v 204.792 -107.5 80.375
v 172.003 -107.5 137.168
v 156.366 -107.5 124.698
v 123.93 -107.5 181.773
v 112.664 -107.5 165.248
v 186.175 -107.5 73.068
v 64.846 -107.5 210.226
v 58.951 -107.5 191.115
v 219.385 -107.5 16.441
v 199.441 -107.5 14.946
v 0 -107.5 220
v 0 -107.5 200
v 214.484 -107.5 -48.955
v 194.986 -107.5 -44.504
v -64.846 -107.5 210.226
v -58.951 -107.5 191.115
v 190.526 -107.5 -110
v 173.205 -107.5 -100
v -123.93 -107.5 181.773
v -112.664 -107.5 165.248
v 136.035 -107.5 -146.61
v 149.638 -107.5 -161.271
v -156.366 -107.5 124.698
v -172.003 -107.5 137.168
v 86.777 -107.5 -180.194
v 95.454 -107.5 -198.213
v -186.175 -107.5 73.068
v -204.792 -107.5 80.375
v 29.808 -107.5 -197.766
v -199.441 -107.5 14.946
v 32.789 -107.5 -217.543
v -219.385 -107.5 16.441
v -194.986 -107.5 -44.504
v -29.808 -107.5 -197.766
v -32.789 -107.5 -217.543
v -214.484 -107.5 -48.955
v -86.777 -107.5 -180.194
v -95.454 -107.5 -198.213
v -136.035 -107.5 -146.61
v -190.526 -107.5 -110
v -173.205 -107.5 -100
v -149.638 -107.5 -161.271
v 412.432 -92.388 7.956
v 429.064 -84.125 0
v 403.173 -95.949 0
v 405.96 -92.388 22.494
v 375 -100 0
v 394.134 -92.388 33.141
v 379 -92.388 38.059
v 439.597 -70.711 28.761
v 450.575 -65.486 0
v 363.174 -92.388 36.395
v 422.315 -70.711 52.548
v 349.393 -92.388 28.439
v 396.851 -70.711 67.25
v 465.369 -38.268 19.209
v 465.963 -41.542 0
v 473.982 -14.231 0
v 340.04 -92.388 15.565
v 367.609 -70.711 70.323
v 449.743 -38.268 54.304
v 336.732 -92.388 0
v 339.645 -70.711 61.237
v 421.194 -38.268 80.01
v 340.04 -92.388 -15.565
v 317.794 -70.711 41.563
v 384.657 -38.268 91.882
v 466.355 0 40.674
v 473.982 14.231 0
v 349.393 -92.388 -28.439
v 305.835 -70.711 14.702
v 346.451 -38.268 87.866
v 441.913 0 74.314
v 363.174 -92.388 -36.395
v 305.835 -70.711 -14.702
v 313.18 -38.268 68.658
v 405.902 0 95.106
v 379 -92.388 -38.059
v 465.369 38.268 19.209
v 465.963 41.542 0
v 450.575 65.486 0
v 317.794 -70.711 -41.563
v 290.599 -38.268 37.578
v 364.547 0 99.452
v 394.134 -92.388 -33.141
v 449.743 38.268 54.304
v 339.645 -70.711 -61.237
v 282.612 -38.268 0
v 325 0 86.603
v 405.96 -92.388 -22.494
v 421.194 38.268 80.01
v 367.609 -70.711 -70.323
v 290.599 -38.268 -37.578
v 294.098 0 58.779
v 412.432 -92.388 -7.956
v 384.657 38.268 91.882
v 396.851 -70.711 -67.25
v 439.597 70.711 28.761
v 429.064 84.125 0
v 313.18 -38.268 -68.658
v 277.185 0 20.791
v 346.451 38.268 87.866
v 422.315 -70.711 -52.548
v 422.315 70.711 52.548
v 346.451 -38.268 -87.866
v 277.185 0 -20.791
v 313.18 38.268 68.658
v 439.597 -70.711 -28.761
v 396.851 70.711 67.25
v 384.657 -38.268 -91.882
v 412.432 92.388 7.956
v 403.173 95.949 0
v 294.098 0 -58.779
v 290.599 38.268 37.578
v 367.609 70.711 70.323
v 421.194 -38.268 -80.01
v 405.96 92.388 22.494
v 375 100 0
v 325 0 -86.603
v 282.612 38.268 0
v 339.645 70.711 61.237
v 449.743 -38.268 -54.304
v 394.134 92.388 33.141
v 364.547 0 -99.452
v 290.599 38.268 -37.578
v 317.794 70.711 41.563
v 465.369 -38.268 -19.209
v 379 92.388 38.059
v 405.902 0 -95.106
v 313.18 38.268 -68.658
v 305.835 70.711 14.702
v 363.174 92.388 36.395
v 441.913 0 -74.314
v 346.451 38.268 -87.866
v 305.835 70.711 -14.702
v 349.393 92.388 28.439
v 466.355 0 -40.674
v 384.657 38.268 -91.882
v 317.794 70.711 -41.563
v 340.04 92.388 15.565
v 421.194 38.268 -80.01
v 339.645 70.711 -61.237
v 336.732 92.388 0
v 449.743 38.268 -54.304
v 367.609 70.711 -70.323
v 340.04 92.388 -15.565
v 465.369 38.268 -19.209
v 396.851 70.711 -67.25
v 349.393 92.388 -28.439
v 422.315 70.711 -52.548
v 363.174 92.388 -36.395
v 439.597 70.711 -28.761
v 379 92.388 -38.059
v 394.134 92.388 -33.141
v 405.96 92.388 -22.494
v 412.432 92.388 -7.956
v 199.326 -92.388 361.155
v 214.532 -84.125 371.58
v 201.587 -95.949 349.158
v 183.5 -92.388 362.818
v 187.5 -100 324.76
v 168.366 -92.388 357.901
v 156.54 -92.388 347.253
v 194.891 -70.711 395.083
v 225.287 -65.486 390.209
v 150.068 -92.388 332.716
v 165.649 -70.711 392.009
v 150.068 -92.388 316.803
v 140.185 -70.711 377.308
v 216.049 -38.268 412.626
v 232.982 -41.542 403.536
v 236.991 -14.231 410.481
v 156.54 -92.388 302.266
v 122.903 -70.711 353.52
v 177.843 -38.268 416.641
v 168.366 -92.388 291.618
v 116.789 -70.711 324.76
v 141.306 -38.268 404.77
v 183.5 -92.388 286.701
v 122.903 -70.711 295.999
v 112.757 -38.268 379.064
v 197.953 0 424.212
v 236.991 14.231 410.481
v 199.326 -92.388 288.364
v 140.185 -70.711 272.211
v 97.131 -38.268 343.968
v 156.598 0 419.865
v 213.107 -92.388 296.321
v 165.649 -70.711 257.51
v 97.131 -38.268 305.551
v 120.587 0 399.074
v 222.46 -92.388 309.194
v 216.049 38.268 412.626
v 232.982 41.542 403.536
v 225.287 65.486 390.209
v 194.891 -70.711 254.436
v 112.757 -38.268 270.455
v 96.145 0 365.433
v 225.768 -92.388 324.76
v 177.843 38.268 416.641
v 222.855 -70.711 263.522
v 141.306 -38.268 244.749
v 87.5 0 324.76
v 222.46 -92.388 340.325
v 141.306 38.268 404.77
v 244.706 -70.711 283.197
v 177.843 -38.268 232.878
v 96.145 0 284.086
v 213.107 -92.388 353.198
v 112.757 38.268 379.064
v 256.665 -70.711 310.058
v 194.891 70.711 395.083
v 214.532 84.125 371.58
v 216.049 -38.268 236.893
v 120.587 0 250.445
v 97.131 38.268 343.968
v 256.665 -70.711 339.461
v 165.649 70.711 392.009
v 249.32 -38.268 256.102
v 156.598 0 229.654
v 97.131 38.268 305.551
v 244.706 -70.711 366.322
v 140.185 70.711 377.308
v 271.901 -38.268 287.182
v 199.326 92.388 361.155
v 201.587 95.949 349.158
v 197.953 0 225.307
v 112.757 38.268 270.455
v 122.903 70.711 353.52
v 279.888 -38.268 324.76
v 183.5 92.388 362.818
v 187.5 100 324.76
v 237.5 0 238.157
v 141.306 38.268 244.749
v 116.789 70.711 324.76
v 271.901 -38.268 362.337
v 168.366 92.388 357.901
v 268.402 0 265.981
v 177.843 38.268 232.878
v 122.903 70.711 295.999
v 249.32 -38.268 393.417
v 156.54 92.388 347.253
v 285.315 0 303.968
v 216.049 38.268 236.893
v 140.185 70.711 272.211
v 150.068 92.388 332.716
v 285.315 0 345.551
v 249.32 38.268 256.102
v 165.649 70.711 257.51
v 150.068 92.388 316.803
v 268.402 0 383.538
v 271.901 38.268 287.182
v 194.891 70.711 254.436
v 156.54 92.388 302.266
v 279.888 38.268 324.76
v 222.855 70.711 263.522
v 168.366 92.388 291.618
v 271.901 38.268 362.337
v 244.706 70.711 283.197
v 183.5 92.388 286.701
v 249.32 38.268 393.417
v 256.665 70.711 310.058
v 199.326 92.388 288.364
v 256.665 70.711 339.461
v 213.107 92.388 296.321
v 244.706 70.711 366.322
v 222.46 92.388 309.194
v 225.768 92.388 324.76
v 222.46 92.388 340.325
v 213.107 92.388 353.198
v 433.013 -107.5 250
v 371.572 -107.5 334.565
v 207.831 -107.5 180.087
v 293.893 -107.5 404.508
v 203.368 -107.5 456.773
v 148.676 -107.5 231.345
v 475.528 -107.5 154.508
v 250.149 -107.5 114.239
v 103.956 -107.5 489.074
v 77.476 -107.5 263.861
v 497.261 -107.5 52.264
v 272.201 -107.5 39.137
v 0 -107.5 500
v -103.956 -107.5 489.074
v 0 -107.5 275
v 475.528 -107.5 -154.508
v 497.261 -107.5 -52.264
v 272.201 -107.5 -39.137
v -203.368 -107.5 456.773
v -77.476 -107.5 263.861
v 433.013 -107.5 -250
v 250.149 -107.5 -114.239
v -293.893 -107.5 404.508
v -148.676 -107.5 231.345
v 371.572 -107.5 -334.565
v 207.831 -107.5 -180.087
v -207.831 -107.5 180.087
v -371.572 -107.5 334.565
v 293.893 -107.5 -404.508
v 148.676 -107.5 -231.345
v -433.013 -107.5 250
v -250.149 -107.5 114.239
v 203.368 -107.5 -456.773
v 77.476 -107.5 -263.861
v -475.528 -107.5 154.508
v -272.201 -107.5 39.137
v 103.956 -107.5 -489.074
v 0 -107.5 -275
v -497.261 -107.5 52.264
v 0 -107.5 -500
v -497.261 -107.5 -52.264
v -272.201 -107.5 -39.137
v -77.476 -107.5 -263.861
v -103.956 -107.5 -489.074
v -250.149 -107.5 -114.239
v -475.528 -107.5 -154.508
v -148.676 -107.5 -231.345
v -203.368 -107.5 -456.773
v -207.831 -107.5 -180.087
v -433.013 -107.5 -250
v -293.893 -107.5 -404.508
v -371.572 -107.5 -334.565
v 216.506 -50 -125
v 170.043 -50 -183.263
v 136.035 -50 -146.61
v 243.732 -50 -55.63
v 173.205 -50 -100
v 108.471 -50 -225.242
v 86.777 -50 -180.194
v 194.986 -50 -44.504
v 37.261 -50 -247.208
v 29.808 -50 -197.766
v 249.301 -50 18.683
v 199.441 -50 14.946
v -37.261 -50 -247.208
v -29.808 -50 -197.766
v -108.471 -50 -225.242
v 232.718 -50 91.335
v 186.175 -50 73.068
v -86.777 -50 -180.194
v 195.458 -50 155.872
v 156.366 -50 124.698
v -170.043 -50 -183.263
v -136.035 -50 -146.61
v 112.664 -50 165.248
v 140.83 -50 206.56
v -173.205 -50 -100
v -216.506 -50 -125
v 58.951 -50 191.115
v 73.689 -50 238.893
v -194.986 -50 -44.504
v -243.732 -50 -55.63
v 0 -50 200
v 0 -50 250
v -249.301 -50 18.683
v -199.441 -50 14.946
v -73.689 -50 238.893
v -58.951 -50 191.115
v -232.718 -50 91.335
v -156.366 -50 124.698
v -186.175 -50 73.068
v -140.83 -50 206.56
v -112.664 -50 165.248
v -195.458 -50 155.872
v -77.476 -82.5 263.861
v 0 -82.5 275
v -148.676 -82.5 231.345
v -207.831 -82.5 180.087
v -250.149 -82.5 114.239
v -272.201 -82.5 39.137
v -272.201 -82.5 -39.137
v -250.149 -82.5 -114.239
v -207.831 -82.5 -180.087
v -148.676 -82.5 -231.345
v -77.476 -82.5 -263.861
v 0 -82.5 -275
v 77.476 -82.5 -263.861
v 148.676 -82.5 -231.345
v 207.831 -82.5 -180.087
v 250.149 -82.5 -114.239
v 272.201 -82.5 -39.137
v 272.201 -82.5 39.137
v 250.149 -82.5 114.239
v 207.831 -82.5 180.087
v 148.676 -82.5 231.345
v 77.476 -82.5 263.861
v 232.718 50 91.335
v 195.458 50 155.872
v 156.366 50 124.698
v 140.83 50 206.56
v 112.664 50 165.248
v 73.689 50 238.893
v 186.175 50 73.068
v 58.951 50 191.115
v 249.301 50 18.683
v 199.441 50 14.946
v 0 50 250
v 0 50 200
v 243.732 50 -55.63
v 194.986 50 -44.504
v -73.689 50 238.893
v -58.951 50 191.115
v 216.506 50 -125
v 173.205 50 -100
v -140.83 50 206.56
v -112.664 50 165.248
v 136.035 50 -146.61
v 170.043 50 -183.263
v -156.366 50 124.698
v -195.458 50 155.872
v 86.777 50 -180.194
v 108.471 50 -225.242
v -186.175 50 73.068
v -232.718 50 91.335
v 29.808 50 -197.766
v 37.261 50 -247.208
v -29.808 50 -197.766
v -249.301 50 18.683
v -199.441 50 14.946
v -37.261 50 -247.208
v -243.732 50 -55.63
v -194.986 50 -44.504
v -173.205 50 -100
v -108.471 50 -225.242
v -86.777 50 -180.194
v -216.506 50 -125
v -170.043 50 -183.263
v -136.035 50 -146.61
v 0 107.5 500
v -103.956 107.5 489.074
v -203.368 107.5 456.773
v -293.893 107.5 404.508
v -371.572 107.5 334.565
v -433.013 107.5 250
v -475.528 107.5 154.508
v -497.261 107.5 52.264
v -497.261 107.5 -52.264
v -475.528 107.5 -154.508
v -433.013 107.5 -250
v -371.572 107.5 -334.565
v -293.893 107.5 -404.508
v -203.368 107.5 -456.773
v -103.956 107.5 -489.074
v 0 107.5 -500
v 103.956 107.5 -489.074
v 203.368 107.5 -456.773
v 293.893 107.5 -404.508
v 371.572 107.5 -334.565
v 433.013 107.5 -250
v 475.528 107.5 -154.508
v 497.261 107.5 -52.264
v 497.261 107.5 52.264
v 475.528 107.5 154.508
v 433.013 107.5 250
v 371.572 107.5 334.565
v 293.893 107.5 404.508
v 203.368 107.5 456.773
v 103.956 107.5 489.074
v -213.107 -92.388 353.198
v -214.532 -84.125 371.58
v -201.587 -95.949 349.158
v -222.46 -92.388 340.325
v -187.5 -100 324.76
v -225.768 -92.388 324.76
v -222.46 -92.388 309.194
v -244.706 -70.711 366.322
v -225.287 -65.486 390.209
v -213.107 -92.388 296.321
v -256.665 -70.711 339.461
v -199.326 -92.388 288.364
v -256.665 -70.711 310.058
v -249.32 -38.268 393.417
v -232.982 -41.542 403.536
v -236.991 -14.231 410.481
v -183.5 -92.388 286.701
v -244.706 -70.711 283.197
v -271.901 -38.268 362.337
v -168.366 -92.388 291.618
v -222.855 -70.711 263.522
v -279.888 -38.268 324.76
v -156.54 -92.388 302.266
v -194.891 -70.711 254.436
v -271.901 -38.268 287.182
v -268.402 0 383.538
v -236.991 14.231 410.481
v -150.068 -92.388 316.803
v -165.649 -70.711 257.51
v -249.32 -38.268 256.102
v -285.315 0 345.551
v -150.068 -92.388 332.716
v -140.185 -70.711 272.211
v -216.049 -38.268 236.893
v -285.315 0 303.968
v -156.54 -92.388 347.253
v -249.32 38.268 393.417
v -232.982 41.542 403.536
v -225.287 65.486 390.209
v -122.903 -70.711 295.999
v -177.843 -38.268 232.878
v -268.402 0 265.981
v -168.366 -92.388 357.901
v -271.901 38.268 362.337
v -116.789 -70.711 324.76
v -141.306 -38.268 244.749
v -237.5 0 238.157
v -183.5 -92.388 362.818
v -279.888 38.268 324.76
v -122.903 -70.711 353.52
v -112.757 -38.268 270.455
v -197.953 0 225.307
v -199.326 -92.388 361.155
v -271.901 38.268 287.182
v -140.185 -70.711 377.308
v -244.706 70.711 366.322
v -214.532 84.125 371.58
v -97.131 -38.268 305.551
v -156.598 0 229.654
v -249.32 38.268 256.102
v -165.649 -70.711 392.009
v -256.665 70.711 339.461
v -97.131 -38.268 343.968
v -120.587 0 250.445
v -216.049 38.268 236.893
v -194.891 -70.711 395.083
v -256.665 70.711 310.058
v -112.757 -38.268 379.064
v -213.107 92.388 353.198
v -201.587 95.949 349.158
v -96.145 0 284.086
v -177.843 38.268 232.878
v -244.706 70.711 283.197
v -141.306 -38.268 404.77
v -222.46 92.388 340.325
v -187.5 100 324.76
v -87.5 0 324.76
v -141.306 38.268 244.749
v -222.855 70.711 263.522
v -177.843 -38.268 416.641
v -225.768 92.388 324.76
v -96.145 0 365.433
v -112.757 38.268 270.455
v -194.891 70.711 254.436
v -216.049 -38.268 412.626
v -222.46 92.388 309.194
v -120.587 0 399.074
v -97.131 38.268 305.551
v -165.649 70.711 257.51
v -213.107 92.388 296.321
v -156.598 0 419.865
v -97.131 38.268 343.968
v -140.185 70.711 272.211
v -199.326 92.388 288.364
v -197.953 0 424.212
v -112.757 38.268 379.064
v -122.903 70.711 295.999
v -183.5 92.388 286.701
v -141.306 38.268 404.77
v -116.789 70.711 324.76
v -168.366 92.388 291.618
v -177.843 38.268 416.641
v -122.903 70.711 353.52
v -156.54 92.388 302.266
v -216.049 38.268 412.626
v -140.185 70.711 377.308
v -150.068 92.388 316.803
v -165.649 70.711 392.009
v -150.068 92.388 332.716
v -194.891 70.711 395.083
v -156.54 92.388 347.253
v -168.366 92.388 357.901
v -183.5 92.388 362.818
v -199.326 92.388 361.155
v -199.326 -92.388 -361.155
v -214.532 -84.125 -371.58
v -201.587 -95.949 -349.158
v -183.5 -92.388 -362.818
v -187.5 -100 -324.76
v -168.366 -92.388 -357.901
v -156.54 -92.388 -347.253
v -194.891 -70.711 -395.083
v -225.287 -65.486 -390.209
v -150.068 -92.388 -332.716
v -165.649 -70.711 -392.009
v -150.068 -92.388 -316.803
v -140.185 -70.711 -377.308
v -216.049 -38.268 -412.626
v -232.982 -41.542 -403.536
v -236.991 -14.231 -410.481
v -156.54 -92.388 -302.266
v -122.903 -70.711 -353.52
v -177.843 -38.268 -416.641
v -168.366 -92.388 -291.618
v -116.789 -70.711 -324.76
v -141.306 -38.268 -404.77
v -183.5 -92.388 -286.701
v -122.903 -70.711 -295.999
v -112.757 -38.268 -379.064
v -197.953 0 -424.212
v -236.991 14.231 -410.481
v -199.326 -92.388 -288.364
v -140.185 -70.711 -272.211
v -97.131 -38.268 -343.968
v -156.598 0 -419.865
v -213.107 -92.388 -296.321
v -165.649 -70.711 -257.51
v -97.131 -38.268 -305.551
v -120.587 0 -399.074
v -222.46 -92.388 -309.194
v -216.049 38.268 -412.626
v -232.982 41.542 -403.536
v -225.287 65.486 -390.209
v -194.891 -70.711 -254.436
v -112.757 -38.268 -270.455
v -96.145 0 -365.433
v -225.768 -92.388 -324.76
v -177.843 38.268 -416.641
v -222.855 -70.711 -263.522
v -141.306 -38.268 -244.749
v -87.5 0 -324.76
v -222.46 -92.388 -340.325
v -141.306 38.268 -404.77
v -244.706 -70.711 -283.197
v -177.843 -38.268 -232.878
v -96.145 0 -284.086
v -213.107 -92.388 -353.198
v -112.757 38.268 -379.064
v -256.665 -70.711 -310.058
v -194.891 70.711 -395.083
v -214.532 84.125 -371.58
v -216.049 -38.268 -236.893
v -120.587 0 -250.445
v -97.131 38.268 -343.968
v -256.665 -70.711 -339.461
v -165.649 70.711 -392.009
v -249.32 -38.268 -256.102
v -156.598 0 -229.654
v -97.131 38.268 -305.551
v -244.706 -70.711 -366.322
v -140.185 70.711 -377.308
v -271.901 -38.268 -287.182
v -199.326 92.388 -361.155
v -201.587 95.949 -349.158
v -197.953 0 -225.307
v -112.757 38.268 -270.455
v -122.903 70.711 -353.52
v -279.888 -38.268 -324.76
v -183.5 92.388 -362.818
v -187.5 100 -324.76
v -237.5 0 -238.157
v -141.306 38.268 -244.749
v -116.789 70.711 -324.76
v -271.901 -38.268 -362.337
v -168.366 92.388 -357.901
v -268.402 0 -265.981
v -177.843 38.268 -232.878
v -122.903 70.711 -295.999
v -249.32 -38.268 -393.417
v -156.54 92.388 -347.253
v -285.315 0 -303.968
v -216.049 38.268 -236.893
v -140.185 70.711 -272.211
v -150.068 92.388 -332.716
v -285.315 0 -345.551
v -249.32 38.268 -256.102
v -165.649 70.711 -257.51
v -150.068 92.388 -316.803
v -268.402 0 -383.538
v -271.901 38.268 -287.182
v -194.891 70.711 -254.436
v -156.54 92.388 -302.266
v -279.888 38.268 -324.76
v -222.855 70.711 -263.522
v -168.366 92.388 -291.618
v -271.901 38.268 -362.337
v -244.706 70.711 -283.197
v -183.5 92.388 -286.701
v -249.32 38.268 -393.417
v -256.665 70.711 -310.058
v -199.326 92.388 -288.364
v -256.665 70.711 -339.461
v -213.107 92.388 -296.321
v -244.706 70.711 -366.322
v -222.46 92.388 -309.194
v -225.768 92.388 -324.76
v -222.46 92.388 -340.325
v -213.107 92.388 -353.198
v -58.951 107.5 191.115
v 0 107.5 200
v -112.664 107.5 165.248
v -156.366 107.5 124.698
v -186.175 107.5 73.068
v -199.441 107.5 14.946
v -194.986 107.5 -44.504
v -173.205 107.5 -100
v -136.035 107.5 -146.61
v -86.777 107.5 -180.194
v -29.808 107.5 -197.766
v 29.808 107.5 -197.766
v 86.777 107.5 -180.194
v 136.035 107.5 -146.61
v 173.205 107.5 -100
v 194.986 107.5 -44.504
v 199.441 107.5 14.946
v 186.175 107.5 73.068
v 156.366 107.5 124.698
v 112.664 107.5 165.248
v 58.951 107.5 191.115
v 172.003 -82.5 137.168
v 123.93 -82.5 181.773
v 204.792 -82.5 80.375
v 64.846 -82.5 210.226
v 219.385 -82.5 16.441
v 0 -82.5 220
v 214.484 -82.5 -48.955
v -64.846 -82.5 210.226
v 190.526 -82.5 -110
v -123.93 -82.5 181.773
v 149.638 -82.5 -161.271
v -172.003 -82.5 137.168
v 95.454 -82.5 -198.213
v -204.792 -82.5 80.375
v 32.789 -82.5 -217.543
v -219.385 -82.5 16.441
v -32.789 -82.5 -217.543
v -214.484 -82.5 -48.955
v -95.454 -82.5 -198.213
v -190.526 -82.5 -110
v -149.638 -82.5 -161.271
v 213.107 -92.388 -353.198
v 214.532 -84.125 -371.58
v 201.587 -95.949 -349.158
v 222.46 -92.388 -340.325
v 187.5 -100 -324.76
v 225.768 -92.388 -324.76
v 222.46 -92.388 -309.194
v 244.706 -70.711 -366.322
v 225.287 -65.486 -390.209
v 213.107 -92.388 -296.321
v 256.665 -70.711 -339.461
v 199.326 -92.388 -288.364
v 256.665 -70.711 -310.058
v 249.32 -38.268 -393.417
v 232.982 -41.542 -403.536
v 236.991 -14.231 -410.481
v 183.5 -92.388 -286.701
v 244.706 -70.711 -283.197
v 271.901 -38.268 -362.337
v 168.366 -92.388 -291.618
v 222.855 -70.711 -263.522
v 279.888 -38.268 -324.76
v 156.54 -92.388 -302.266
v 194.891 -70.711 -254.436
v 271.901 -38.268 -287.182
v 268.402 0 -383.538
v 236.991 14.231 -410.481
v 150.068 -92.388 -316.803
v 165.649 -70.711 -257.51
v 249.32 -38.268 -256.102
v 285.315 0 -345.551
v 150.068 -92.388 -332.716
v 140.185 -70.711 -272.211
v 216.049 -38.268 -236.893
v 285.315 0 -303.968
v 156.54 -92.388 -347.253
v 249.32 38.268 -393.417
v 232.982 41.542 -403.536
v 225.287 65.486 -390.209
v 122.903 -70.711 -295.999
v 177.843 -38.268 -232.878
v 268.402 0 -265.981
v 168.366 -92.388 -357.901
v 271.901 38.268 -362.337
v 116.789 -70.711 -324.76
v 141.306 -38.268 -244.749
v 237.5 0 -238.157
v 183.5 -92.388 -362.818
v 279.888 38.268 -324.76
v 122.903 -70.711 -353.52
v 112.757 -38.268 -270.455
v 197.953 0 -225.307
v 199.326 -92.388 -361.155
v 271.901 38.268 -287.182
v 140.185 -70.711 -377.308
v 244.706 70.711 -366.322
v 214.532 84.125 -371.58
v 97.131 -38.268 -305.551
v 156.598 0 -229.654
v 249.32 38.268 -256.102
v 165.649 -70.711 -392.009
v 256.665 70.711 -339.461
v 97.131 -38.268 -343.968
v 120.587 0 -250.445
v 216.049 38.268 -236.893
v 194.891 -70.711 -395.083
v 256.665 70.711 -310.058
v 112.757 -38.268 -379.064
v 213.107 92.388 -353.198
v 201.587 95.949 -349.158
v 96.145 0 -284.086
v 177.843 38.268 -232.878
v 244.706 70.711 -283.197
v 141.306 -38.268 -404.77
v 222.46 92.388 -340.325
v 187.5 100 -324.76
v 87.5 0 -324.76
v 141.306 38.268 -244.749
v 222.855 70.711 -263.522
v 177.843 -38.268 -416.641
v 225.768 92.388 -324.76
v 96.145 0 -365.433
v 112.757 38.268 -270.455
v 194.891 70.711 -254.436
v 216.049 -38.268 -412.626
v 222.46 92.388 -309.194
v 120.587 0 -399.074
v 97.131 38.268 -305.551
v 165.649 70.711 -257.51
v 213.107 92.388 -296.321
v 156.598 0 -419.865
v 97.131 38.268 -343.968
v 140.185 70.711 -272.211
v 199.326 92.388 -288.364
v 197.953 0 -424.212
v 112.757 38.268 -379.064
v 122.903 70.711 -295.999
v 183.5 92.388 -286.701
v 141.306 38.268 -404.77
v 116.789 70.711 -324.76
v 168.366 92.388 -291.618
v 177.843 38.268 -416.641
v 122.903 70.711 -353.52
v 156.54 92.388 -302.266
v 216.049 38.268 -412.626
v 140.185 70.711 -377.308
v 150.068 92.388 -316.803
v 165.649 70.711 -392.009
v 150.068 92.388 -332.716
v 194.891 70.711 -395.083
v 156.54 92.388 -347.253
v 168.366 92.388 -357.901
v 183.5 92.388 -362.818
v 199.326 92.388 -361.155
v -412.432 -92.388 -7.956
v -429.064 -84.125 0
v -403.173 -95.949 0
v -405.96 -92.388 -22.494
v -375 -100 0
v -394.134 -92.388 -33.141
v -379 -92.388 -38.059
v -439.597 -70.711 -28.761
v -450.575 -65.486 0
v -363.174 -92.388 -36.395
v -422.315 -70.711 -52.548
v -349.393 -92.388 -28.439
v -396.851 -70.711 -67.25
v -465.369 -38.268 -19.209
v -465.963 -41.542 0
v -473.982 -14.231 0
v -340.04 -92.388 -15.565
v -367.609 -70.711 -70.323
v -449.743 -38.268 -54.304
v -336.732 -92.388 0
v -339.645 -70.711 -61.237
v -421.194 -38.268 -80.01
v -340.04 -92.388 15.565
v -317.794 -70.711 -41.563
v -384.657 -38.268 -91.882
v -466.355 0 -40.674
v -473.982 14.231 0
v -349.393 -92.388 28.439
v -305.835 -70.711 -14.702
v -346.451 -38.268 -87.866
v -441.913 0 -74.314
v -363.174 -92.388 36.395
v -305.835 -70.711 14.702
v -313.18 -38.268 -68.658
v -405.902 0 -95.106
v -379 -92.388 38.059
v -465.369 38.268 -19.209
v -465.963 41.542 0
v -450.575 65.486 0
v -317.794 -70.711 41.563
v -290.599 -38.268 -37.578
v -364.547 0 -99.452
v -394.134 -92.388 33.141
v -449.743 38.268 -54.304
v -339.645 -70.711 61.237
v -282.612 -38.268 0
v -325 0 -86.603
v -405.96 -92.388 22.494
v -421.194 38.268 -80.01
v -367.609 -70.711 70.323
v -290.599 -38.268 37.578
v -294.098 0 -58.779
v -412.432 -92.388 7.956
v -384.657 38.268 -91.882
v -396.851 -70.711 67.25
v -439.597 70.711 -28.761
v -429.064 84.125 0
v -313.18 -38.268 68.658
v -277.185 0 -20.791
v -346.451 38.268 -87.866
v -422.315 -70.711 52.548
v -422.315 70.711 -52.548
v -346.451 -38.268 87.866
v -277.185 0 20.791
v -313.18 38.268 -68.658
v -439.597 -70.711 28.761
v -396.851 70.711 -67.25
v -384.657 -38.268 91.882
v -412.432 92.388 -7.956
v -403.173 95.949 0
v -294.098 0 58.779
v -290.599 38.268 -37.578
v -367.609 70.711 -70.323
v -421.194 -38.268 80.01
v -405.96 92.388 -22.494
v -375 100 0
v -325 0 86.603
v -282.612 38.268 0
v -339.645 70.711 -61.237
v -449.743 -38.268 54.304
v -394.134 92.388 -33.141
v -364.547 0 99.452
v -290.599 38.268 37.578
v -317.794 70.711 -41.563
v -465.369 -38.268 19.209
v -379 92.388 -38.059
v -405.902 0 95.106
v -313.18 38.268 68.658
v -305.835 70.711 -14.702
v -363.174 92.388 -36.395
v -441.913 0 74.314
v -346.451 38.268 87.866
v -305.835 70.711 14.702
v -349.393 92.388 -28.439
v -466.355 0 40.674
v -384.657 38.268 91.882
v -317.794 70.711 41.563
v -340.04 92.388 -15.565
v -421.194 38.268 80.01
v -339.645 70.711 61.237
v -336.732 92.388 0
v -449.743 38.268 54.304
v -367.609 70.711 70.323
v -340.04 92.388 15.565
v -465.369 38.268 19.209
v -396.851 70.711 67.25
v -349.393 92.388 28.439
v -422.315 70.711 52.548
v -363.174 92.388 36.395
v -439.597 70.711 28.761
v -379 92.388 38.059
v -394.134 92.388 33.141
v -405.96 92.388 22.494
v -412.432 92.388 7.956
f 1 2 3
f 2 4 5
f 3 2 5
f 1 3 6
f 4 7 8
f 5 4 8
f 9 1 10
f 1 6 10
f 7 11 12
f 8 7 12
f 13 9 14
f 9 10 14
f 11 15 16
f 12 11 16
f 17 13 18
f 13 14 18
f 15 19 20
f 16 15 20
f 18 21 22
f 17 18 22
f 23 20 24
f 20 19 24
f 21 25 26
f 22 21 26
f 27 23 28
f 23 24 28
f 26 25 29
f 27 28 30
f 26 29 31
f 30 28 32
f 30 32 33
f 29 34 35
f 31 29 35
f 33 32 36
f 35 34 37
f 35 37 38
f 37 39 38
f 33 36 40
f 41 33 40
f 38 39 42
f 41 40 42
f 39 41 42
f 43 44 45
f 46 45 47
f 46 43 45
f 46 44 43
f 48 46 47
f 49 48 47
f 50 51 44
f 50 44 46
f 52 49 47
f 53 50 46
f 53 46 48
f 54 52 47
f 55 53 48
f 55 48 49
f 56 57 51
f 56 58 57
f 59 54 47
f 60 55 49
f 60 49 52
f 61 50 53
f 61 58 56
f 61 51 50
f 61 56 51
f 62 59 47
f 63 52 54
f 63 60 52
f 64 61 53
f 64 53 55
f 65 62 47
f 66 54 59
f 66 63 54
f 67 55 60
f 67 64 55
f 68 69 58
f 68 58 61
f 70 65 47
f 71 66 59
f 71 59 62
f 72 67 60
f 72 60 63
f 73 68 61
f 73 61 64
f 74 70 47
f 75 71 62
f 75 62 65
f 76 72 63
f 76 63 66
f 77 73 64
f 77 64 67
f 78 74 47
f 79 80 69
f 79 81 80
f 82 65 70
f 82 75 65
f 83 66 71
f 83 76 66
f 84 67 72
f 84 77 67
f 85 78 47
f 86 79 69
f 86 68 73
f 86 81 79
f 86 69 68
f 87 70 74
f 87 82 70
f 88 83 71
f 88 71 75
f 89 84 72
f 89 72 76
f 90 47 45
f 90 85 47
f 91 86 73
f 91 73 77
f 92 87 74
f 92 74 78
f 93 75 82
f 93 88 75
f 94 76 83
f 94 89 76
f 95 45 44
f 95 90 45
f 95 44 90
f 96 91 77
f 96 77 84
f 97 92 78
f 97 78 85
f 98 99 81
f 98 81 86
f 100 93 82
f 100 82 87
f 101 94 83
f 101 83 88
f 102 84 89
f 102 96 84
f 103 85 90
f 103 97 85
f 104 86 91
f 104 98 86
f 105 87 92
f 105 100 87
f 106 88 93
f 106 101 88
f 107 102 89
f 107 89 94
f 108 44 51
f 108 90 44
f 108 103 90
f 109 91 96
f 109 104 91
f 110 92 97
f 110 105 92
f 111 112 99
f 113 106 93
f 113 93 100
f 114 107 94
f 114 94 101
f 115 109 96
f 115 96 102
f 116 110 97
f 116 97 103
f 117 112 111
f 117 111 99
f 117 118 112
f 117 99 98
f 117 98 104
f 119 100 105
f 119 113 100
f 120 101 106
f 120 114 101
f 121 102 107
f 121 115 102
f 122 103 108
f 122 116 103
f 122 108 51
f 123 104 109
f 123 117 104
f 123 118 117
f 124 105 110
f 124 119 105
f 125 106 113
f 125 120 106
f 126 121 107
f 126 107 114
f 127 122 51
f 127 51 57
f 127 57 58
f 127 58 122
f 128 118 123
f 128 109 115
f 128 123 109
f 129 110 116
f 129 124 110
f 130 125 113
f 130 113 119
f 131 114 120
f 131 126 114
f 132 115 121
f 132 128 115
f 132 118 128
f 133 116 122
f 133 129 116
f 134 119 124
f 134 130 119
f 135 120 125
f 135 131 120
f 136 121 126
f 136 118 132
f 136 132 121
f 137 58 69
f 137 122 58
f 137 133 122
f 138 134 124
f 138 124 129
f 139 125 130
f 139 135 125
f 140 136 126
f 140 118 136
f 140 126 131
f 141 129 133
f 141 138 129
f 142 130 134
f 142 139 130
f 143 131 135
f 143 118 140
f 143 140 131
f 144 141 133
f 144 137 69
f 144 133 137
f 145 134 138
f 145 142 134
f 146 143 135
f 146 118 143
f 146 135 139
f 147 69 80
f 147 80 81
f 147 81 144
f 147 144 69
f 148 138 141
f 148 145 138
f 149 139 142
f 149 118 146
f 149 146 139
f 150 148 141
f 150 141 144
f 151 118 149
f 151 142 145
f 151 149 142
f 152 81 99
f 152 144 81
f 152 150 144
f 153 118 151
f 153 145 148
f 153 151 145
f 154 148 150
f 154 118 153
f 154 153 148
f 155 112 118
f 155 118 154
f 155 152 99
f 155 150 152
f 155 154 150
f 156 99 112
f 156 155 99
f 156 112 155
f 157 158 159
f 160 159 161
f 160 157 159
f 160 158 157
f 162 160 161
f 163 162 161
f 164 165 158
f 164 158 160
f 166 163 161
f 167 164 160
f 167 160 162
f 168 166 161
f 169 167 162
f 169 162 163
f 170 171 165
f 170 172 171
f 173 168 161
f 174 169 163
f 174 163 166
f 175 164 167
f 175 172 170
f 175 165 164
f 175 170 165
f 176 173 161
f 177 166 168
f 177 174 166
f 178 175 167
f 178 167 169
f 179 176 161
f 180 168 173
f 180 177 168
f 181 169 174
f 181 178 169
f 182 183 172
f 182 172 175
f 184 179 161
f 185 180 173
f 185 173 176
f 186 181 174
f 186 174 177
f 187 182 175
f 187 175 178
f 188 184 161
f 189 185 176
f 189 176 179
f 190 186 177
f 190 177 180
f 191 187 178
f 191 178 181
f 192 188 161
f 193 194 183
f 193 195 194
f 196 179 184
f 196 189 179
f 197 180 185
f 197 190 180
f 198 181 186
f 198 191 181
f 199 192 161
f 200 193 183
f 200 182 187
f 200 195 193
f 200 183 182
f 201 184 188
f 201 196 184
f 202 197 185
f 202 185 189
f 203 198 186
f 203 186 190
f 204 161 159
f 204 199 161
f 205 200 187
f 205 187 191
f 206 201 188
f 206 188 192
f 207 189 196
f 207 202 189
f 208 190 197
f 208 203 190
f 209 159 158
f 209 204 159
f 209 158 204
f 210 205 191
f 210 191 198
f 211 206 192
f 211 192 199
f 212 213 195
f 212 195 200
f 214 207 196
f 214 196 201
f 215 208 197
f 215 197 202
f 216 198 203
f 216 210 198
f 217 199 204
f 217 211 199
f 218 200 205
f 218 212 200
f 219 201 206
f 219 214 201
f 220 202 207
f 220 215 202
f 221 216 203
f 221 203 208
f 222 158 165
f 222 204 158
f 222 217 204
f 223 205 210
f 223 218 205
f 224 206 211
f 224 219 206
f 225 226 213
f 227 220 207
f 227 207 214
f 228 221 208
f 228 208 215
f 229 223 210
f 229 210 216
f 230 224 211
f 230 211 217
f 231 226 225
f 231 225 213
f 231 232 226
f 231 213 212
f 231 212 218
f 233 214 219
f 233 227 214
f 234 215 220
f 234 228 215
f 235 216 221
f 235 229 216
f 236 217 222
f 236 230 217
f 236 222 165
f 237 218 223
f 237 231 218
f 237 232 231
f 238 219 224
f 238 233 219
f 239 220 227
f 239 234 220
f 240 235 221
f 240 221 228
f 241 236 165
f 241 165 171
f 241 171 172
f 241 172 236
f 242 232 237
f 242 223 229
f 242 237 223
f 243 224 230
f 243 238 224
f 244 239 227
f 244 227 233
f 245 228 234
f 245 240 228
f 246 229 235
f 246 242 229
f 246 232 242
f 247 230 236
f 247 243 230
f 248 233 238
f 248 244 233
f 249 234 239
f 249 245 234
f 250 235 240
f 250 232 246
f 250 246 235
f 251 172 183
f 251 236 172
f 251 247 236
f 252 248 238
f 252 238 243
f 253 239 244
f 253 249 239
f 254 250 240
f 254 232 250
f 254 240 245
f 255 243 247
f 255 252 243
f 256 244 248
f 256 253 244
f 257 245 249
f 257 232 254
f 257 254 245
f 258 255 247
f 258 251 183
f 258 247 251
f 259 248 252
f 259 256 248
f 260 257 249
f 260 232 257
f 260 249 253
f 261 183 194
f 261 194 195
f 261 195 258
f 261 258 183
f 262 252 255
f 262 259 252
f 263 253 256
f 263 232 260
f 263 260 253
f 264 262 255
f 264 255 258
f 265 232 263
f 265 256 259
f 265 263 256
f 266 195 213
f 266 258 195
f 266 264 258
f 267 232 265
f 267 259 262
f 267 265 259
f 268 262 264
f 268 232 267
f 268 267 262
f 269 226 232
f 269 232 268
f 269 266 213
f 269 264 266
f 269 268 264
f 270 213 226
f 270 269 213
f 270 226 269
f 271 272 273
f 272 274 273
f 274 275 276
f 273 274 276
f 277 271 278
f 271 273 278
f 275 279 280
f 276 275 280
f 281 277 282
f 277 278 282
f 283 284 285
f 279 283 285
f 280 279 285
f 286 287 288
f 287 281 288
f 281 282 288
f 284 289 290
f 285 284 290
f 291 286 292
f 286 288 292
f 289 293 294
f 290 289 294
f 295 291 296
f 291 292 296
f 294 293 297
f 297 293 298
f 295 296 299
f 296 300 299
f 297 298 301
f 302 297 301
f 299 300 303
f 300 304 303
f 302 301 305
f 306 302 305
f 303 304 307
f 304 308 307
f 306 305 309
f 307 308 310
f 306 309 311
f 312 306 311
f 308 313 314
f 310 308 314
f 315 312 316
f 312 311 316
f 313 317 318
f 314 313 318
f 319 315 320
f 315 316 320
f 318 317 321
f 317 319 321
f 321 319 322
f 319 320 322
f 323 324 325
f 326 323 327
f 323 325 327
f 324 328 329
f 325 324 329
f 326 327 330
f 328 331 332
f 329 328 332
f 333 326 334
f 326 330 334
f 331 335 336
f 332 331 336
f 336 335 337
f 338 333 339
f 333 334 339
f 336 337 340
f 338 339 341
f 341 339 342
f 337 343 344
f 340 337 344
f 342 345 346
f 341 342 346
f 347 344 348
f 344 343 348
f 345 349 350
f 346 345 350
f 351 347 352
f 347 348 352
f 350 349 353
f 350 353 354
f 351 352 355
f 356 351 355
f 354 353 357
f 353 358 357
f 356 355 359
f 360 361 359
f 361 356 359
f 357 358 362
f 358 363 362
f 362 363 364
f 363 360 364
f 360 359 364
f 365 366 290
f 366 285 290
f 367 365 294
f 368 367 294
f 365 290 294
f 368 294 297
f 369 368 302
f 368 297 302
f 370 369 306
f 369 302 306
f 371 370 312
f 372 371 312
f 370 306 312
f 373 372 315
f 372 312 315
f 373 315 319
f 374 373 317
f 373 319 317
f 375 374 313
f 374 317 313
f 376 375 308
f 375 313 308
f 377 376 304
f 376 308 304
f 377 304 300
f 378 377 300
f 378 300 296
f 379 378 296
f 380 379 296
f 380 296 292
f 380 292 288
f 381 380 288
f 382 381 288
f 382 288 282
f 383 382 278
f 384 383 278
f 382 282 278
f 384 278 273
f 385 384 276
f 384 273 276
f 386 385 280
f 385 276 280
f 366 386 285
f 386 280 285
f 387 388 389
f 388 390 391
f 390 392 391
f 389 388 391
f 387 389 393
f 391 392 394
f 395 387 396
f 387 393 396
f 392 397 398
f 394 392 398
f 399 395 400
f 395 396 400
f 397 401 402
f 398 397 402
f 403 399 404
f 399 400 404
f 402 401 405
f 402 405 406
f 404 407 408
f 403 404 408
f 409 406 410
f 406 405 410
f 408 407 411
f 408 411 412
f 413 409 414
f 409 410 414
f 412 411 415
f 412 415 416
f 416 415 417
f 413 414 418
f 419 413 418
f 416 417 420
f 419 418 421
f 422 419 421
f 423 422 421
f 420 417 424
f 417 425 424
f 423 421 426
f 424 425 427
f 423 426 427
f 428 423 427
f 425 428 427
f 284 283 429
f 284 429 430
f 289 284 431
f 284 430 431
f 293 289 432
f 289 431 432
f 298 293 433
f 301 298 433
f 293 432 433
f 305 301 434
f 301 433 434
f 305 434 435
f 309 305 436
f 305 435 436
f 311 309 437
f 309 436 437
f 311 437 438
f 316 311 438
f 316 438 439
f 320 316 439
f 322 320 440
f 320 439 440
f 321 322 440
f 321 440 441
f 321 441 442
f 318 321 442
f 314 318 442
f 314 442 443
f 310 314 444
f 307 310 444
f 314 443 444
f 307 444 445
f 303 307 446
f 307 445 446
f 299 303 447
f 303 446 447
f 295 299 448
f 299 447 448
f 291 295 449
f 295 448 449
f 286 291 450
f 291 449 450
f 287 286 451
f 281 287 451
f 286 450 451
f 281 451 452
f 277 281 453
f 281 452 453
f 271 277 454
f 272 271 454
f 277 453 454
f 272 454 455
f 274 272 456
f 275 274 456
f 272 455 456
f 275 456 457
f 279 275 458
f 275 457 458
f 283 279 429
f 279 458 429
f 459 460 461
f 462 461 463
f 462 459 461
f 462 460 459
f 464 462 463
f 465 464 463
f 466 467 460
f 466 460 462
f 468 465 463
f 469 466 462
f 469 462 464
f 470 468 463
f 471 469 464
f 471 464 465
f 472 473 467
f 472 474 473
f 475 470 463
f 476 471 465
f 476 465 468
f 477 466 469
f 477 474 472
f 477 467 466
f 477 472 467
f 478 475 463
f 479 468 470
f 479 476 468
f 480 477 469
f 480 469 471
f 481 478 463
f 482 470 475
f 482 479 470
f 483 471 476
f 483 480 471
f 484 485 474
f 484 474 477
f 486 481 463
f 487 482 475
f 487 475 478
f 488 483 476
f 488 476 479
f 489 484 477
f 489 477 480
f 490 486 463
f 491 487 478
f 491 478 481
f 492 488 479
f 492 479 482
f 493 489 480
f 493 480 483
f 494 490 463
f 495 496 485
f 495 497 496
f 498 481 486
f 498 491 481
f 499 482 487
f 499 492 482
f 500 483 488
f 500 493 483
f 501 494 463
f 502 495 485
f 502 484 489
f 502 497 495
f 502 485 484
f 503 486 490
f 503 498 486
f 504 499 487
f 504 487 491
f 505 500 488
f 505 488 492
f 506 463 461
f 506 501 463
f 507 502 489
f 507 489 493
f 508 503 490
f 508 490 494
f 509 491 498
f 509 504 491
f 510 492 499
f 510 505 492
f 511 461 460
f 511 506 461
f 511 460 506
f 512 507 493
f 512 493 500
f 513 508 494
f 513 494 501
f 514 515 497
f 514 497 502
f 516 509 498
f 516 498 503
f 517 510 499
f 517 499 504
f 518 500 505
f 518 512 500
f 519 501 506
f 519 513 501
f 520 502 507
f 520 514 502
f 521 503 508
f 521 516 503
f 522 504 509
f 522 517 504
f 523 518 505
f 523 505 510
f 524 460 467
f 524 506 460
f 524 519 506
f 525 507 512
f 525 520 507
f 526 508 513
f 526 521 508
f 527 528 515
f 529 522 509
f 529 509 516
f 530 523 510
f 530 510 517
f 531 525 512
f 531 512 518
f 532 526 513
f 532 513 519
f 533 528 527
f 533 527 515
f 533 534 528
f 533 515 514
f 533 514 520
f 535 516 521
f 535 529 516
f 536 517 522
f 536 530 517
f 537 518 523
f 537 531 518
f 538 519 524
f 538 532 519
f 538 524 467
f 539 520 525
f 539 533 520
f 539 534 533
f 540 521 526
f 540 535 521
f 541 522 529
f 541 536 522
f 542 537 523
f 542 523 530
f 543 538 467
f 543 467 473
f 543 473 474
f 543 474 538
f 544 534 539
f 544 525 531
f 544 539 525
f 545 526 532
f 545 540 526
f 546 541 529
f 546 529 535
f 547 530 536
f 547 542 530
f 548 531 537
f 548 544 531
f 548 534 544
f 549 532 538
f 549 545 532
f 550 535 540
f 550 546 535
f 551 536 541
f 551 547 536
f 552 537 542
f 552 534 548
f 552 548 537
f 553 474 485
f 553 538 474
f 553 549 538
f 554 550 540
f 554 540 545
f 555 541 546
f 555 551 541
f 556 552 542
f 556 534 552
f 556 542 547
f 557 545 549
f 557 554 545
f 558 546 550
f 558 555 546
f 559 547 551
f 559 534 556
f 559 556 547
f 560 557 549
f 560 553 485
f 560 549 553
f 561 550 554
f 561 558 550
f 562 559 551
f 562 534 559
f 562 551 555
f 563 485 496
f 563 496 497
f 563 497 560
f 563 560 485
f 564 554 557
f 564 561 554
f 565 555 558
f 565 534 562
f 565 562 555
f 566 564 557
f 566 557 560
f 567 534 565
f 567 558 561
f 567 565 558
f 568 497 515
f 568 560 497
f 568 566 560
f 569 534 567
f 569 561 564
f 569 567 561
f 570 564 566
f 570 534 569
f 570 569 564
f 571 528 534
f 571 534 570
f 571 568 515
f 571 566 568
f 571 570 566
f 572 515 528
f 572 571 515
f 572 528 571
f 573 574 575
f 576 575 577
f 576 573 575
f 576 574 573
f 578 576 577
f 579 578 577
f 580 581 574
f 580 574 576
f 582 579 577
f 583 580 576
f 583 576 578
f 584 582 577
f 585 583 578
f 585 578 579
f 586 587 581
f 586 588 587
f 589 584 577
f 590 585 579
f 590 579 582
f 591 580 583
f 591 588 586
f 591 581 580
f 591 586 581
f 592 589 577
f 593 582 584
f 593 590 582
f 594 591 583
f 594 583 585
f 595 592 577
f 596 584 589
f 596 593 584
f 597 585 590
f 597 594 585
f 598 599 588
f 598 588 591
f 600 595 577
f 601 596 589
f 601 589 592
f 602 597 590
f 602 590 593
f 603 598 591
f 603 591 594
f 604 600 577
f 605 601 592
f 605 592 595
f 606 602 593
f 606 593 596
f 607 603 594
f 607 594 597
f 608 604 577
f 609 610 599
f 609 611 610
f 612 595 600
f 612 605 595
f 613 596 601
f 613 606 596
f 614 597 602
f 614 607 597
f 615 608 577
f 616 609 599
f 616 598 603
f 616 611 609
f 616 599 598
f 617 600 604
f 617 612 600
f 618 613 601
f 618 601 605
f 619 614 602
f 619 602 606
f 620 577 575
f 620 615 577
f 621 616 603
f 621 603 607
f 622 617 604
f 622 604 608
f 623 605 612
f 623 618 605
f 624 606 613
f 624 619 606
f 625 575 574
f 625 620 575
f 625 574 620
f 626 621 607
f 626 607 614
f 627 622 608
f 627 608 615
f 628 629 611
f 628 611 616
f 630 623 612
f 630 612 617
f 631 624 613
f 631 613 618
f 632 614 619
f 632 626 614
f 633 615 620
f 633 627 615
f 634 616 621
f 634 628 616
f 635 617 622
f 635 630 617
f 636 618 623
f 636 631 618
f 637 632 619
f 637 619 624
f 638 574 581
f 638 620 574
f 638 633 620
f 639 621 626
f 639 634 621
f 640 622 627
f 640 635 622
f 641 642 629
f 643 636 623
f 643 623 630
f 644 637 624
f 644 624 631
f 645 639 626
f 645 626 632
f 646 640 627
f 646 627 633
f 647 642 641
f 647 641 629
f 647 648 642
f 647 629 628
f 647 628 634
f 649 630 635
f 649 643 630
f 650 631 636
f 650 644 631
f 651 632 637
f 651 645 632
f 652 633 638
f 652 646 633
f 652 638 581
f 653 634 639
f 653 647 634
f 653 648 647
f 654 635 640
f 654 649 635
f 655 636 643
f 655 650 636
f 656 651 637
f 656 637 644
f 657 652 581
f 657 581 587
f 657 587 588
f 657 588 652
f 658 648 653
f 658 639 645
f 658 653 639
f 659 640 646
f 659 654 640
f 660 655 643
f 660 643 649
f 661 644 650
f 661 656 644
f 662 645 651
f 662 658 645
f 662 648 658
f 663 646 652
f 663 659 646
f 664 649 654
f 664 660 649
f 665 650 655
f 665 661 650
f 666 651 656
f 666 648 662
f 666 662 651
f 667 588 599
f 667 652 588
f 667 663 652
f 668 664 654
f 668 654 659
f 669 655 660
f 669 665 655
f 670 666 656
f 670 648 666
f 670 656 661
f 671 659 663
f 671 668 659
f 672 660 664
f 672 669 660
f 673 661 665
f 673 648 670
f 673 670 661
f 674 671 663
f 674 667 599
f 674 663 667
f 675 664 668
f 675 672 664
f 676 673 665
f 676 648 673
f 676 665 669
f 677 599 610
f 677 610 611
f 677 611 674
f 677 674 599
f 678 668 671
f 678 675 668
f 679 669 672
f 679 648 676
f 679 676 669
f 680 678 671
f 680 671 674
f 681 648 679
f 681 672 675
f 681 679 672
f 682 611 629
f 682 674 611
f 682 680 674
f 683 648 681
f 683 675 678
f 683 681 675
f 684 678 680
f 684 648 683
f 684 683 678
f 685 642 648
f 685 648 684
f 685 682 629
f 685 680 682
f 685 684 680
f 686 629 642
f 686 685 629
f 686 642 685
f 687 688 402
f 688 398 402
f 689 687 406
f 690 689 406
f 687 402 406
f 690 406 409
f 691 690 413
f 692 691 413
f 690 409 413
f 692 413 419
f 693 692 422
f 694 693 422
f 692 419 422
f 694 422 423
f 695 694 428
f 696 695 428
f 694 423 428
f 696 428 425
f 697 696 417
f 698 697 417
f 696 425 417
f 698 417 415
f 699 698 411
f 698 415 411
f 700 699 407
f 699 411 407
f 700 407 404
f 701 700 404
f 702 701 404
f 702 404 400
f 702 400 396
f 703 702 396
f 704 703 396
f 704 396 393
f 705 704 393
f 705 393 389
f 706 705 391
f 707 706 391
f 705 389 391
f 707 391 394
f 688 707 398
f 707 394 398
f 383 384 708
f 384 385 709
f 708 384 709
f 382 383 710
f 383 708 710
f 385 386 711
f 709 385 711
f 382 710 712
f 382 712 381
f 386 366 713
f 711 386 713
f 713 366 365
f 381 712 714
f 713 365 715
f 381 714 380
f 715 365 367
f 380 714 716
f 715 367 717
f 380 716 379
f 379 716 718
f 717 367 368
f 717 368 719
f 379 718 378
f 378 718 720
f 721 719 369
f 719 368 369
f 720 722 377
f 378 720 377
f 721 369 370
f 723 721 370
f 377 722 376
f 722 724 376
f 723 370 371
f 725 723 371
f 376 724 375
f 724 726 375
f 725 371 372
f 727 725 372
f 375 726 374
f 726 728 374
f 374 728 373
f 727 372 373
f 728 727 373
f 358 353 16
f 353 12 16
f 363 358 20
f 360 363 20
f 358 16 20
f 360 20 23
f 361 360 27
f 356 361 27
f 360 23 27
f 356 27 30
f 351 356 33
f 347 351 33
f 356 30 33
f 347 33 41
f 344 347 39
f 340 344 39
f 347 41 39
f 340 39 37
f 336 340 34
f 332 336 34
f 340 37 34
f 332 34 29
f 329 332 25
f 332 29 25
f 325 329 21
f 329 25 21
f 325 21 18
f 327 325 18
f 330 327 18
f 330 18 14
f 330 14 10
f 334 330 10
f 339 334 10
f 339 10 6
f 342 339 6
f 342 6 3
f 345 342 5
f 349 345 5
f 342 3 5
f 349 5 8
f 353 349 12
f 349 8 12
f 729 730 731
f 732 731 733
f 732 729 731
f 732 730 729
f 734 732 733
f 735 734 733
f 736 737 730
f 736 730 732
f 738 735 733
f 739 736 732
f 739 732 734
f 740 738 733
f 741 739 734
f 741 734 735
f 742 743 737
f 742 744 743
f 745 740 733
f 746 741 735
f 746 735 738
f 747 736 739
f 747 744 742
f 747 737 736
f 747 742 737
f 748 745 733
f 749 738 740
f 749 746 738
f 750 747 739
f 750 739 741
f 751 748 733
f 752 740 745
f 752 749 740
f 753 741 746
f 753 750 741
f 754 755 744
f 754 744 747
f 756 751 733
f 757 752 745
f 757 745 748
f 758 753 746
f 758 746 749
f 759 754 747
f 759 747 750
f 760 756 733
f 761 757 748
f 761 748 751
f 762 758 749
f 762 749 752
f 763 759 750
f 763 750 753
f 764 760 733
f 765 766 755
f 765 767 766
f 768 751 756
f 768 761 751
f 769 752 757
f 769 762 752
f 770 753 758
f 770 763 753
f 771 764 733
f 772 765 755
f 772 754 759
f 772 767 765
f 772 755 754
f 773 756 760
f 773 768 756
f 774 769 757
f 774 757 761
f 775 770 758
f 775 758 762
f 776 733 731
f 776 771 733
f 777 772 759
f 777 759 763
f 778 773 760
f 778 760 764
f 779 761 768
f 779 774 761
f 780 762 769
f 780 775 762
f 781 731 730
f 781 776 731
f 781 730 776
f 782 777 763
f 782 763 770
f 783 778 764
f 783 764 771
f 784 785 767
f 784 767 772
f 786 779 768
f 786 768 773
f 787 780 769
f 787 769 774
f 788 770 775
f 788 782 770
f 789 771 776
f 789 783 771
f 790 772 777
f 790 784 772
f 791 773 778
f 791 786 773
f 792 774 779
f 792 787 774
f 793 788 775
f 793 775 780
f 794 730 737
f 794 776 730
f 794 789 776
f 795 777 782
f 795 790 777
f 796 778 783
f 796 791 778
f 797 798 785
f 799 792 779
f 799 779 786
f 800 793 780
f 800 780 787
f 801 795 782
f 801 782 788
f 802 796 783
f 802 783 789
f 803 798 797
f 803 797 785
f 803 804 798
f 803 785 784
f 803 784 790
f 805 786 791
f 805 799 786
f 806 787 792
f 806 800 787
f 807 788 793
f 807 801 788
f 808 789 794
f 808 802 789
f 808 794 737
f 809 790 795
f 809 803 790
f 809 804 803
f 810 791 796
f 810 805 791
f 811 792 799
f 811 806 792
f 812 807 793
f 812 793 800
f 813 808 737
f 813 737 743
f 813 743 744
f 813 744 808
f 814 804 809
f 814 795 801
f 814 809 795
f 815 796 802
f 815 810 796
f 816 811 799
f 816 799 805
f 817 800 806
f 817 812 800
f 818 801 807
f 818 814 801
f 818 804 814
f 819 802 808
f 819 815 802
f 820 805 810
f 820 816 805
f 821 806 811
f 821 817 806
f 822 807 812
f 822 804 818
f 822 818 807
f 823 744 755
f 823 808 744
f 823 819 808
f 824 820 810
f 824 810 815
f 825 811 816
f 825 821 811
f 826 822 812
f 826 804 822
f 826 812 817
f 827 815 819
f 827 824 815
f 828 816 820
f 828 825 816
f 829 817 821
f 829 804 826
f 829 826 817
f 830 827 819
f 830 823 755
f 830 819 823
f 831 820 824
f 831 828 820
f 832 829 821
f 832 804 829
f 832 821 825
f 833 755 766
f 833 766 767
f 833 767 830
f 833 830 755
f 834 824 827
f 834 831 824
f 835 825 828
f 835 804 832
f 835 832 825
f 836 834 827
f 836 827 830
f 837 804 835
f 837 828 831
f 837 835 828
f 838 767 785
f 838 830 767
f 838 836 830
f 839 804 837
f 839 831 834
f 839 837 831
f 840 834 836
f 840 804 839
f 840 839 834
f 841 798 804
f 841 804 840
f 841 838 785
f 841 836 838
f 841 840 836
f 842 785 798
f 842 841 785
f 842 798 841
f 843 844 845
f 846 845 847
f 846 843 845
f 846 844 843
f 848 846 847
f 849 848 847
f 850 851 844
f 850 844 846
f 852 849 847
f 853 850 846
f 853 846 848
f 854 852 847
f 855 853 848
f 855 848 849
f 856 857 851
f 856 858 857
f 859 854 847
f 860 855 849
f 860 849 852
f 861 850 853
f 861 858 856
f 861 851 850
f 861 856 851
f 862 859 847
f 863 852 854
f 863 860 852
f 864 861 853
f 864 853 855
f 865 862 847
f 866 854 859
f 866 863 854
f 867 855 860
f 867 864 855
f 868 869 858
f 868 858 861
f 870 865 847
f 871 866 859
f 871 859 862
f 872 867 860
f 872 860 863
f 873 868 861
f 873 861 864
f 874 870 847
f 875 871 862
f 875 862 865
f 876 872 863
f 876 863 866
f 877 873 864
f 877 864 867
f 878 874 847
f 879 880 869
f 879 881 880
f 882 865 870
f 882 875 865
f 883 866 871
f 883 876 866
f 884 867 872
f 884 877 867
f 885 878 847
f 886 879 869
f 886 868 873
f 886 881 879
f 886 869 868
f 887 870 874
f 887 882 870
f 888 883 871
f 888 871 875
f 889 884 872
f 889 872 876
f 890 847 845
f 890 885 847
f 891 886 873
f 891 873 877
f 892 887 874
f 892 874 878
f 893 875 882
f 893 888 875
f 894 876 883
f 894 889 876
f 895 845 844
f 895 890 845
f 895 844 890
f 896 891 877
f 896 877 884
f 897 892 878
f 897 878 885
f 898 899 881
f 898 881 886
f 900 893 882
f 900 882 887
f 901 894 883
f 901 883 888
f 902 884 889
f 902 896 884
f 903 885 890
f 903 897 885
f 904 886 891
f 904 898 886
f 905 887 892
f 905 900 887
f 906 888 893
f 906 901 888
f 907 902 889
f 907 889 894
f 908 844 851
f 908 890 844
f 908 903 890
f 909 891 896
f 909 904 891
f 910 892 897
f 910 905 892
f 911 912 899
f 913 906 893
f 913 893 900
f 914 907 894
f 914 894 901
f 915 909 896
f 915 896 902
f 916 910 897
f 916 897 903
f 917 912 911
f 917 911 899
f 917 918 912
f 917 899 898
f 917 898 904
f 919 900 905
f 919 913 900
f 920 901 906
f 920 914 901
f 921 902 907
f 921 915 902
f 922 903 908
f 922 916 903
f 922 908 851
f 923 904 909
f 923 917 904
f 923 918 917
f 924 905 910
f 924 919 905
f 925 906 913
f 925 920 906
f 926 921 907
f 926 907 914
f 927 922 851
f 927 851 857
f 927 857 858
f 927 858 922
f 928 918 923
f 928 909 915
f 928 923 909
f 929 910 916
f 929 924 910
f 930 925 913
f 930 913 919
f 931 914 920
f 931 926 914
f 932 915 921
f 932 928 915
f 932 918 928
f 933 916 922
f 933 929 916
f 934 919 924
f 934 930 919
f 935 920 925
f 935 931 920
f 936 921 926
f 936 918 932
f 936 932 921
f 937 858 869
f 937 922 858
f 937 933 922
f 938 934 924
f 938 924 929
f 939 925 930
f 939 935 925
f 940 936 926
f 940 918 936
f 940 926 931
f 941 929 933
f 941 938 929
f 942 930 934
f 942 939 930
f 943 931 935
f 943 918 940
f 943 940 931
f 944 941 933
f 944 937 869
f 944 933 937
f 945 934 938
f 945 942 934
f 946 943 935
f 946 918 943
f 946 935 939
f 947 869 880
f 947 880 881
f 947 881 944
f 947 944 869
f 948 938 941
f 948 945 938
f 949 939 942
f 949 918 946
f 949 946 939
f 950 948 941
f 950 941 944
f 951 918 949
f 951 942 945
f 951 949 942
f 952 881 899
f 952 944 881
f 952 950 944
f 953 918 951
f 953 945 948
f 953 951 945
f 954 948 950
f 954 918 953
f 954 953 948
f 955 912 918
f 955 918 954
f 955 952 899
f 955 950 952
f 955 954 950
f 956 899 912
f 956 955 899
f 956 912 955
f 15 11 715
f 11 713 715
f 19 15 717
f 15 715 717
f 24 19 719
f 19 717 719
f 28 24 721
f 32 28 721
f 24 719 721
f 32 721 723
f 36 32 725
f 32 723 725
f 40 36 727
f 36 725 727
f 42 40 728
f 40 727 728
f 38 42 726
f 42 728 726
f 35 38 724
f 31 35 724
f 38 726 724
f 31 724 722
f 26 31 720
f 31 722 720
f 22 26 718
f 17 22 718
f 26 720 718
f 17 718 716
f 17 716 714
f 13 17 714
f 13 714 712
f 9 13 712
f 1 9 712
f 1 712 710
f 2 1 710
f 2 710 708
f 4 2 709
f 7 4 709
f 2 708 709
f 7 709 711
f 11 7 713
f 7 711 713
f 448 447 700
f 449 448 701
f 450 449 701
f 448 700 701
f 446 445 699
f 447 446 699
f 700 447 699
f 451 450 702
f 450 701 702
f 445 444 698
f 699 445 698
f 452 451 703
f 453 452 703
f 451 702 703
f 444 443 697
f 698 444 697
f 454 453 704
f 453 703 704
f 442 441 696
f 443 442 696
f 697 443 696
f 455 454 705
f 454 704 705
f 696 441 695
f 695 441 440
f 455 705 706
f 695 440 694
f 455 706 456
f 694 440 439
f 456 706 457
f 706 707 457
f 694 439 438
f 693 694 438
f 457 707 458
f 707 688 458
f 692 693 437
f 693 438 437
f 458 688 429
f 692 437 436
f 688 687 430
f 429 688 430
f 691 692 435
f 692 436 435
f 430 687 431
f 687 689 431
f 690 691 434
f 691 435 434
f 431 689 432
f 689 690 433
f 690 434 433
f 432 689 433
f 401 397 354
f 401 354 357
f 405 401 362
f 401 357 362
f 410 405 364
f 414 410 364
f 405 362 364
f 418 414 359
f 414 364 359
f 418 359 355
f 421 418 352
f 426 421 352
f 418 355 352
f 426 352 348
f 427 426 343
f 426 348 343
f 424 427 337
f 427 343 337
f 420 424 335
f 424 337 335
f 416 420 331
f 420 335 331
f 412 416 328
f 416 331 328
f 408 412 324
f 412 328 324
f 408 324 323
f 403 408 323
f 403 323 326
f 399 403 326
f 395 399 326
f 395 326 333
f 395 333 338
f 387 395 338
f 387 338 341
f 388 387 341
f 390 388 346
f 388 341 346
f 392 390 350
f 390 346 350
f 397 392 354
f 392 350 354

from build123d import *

# Parameters (mm, degrees)
CIRPATTERN1_COUNT = 6


with BuildPart() as part:
    # Sketch1 → Revolve1 (revolve)
    with BuildSketch(Plane(origin=(0, 0, 0), x_dir=(0, 0, -1), z_dir=(1, 0, 0))):
        Polygon((-250, 50), (-250, -50), (-200, -50), (-200, -107.5), (-220, -107.5), (-220, -82.5), (-275, -82.5), (-275, -107.5), (-500, -107.5), (-500, 107.5), (-200, 107.5), (-200, 50), align=None)
    revolve(axis=Axis((0, 562.012987013, 0), (0, -1, 0)))

    # Sketch2 → Cut-Revolve1 (revolve, cut)
    with BuildSketch(Plane.XY):
        with BuildLine():
            Line((-375, 100), (-375, -100))
            ThreePointArc((-375, -100), (-475, 0), (-375, 100))
        make_face()
    cut_revolve1 = revolve(axis=Axis((-375, 100, 0), (0, -1, 0)), mode=Mode.SUBTRACT)

    # CirPattern1: Cut-Revolve1 ×6 about axis
    cirpattern1_axis = Axis((0, 0, 0), (0, 1, 0))
    for i in range(1, CIRPATTERN1_COUNT):
        add(cut_revolve1.rotate(cirpattern1_axis, i * 360 / CIRPATTERN1_COUNT), mode=Mode.SUBTRACT)


solid = part.part
